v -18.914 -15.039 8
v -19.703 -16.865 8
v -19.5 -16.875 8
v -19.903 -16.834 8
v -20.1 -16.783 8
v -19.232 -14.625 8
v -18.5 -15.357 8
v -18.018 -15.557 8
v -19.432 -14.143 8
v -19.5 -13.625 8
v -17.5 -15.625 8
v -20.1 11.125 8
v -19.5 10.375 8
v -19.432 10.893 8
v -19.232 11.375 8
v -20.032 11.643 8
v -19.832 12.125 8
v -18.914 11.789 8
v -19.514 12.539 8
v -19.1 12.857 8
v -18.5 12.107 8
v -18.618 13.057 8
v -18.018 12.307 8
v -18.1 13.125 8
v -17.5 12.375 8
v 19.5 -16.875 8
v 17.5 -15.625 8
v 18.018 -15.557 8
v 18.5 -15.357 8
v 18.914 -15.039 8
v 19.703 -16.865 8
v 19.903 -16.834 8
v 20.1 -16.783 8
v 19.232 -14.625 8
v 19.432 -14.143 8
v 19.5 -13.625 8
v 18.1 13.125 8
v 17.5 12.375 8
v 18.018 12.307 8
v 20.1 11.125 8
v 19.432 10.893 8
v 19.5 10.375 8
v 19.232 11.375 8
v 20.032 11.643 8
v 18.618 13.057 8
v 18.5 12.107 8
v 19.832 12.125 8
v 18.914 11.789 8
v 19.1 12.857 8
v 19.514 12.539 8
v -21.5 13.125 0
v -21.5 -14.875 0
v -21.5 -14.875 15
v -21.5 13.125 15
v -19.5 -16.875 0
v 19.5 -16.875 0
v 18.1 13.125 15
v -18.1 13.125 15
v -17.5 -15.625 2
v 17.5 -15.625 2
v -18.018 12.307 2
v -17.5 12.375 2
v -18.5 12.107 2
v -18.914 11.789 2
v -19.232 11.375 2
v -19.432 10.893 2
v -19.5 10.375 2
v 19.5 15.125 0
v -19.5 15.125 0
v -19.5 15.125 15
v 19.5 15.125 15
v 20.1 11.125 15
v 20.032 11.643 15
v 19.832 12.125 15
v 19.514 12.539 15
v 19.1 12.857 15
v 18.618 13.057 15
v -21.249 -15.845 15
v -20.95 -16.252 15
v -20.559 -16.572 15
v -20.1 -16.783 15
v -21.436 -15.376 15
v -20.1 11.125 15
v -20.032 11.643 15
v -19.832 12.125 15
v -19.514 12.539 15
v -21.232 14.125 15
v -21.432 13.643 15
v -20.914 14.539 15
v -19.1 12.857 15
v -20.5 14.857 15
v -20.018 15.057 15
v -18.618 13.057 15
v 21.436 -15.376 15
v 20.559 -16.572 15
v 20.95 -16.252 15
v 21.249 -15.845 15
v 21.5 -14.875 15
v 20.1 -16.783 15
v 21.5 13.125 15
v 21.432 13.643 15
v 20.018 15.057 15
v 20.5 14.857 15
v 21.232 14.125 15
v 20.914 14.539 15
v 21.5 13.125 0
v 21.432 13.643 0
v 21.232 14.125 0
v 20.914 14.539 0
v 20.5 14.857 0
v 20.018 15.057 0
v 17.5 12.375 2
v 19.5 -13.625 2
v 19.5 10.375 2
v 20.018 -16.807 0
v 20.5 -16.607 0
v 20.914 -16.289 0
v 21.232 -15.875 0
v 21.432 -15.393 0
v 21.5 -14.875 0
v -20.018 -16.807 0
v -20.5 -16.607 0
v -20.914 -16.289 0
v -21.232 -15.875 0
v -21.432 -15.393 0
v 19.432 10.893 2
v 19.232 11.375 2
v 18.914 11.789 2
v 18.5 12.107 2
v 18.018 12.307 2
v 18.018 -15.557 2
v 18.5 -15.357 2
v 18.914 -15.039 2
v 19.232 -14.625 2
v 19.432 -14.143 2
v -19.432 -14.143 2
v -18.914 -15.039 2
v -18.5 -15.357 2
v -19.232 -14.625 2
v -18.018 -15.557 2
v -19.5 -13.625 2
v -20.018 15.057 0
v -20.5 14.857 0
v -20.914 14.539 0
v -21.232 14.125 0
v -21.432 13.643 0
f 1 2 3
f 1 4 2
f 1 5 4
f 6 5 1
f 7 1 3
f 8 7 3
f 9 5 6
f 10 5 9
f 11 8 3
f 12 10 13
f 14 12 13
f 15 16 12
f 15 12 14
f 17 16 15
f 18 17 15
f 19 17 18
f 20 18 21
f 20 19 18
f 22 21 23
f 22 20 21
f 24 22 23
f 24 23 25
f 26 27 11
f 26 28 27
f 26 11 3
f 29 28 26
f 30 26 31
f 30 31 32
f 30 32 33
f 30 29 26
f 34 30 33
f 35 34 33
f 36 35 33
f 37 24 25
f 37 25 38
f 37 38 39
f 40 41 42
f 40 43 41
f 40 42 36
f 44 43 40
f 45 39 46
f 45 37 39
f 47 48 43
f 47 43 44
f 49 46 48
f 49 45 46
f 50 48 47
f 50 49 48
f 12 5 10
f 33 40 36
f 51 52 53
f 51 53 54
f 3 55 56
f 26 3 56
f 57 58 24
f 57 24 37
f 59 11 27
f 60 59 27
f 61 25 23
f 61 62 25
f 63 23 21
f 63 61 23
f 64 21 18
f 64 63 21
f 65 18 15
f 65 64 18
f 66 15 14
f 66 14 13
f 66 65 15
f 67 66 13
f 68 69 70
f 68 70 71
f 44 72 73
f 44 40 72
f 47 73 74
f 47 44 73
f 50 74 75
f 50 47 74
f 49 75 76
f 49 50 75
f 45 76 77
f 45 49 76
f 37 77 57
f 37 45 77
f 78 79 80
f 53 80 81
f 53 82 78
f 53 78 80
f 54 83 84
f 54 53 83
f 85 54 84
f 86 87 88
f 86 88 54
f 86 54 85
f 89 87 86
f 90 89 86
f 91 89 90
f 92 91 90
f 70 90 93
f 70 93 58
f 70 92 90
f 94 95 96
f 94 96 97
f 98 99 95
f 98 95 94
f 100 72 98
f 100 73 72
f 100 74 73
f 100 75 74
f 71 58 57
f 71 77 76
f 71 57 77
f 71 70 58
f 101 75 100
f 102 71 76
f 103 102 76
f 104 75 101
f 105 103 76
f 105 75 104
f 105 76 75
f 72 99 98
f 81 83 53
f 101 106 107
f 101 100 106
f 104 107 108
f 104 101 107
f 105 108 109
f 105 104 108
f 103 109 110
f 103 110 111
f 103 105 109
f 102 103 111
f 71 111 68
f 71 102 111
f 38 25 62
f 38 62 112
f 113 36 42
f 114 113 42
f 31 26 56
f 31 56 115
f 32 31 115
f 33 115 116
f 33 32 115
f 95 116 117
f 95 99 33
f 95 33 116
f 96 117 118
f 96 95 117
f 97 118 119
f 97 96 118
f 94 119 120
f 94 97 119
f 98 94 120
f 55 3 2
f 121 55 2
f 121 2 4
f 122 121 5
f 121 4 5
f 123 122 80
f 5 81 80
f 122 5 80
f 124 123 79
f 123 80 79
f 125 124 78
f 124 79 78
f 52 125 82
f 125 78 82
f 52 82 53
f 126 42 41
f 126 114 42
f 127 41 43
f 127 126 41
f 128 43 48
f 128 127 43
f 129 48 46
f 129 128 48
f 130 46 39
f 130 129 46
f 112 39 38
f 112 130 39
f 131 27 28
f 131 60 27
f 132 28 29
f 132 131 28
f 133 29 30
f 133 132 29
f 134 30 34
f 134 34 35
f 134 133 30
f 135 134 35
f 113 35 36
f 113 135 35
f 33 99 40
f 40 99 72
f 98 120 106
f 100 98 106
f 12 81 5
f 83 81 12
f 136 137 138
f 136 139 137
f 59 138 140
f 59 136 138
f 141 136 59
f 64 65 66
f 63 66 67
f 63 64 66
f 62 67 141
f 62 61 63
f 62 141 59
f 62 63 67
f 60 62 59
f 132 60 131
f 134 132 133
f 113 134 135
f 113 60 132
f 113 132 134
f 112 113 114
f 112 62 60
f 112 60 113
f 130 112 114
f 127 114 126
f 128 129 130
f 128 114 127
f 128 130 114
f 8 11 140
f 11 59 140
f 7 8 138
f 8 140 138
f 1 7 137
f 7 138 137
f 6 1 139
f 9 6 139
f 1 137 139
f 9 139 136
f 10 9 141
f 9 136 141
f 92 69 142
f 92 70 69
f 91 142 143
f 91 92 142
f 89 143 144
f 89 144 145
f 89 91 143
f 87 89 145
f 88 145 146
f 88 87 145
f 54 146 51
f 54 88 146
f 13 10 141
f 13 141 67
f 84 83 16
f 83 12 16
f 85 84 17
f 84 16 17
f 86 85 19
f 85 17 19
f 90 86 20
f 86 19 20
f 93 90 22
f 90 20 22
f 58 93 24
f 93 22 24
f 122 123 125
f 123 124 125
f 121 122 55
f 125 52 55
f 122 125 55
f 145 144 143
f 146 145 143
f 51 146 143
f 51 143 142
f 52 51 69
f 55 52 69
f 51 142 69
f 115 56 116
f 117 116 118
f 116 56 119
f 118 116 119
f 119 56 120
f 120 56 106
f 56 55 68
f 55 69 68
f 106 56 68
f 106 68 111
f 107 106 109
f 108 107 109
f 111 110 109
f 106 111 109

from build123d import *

# Parameters (mm, degrees)
SKETCH1_W           = 43
SKETCH1_H           = 32
BOSS_EXTRUDE1_DEPTH = 15
SKETCH2_W           = 40.2
SKETCH2_H           = 30
CUT_EXTRUDE1_DEPTH  = 7
SKETCH3_W           = 39
SKETCH3_H           = 28
CUT_EXTRUDE2_DEPTH  = 6
FILLET2_R           = 2
FILLET4_R           = 2


with BuildPart() as part:
    # Sketch1 → Boss-Extrude1 (new body)
    with BuildSketch(Plane.XY):
        with Locations((0, -0.875)):
            Rectangle(SKETCH1_W, SKETCH1_H)
    extrude(amount=BOSS_EXTRUDE1_DEPTH)

    # Sketch2 → Cut-Extrude1 (cut)
    with BuildSketch(Plane.XY.offset(15)):
        with Locations((0, -1.875)):
            Rectangle(SKETCH2_W, SKETCH2_H)
    extrude(amount=-CUT_EXTRUDE1_DEPTH, mode=Mode.SUBTRACT)

    # Sketch3 → Cut-Extrude2 (cut)
    with BuildSketch(Plane.XY.offset(8)):
        with Locations((0, -1.625)):
            Rectangle(SKETCH3_W, SKETCH3_H)
    extrude(amount=-CUT_EXTRUDE2_DEPTH, mode=Mode.SUBTRACT)

    # Fillet2
    fillet2_edges = [part.edges().sort_by_distance(p)[0] for p in [
        (20.1, 13.125, 11.5),
        (-20.1, 13.125, 11.5),
        (19.5, 12.375, 5),
        (19.5, -15.625, 5),
        (-19.5, -15.625, 5),
        (-19.5, 12.375, 5),
    ]]
    fillet(fillet2_edges, radius=FILLET2_R)

    # Fillet4
    fillet4_edges = [part.edges().sort_by_distance(p)[0] for p in [
        (-21.5, -16.875, 7.5),
        (21.5, -16.875, 7.5),
        (21.5, 15.125, 7.5),
        (-21.5, 15.125, 7.5),
    ]]
    fillet(fillet4_edges, radius=FILLET4_R)


solid = part.part
